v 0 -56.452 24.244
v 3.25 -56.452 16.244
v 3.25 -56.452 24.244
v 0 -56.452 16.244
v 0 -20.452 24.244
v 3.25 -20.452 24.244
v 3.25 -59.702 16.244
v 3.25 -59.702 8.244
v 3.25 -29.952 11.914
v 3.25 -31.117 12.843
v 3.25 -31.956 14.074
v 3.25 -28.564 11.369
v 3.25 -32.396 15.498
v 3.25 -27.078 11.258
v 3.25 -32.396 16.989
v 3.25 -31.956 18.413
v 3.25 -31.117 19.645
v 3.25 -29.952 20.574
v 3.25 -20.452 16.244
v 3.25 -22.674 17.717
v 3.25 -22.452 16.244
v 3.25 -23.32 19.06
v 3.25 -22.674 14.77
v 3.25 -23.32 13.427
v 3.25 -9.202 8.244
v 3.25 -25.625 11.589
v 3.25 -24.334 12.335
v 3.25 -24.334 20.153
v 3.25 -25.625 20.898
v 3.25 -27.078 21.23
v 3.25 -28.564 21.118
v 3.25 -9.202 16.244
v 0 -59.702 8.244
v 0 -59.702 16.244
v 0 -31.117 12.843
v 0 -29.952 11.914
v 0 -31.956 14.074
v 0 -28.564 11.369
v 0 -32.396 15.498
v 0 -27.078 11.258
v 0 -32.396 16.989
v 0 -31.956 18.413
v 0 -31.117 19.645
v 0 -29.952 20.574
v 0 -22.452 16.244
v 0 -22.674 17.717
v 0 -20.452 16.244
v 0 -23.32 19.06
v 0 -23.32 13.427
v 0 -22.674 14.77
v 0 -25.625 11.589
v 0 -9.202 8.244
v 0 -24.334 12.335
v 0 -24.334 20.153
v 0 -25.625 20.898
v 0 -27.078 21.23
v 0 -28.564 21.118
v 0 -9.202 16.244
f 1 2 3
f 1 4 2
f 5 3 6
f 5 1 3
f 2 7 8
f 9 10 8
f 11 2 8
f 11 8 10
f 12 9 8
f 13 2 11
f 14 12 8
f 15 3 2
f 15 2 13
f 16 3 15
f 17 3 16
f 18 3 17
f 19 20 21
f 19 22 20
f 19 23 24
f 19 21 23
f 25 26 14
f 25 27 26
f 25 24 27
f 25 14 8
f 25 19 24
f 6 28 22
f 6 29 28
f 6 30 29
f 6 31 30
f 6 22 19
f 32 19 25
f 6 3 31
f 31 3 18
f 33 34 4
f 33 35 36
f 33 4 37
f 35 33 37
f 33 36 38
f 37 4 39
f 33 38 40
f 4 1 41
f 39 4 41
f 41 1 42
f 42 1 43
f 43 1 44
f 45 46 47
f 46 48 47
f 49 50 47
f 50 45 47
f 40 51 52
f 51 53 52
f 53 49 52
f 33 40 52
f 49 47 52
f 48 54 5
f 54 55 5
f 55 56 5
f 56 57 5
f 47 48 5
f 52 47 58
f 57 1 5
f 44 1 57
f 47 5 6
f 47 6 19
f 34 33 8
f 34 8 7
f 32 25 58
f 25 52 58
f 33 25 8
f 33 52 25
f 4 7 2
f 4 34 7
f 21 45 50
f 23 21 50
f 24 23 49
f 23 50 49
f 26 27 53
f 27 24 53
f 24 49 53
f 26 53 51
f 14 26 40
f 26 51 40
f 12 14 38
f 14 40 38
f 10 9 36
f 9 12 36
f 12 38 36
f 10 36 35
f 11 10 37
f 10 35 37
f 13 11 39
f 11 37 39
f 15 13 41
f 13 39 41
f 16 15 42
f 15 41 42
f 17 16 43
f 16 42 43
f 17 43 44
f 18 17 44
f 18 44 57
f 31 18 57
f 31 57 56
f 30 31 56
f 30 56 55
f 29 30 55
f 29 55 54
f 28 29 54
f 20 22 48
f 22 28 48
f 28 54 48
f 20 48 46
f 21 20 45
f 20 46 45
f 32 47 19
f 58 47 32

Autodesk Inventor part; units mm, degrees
ref_plane "YZ Plane" through (0, 0, 0) normal (1, 0, 0) x (0, 1, 0)
ref_plane "XZ Plane" through (0, 0, 0) normal (0, 1, 0) x (-1, 0, 0)
ref_plane "XY Plane" through (0, 0, 0) normal (0, 0, 1) x (1, 0, 0)
sketch "Sketch1" plane through (0, 0, 0) normal (1, 0, 0) x (0, 1, 0)
  line L0 (-92.7646, -8.503) -> (-89.7646, -8.503)
  line L1 (-89.7646, -8.503) -> (-89.7646, -11.753)
  line L2 (-89.7646, -11.753) -> (-92.7646, -11.753)
  line L3 (-92.7646, -11.753) -> (-92.7646, -8.503)
  line L4 (-92.7646, -21.6527) -> (-89.7646, -21.6527)
  line L5 (-89.7646, -21.6527) -> (-89.7646, -21.7527)
  line L6 (-89.7646, -21.7527) -> (-92.7646, -21.7527)
  line L7 (-92.7646, -21.7527) -> (-92.7646, -21.6527)
  line L8 (-56.4516, 8.2437) -> (-59.7016, 8.2437)
  line L9 (-59.7016, 8.2437) -> (-59.7016, 16.2437)
  line L10 (-59.7016, 16.2437) -> (-56.4516, 16.2437)
  line L11 (-56.4516, 16.2437) -> (-56.4516, 8.2437)
  line L12 (-34.4516, 24.2437) -> (-34.4516, 8.2437) construction
  line L13 (-12.4516, 8.2437) -> (-9.2016, 8.2437)
  line L14 (-9.2016, 8.2437) -> (-9.2016, 16.2437)
  line L15 (-9.2016, 16.2437) -> (-12.4516, 16.2437)
  line L16 (-12.4516, 16.2437) -> (-12.4516, 8.2437)
  circle A0 centre (-27.4516, 16.2437) radius 5
  line L17 (-12.4516, 8.2437) -> (-20.4516, 8.2437)
  line L18 (-20.4516, 8.2437) -> (-20.4516, 16.2437)
  line L19 (-20.4516, 16.2437) -> (-12.4516, 16.2437)
  line L20 (-12.4516, 16.2437) -> (-12.4516, 8.2437)
  line L21 (-20.4516, 8.2437) -> (-56.4516, 8.2437)
  line L22 (-56.4516, 8.2437) -> (-56.4516, 24.2437)
  line L23 (-56.4516, 24.2437) -> (-20.4516, 24.2437)
  line L24 (-20.4516, 24.2437) -> (-20.4516, 8.2437)
  point P0 (0, 0)
  dimension "d0" = 3
  dimension "mat" = 3.25
  dimension "d2" = 3
  dimension "kerf" = 0.1
  dimension "d27" = 3.25
  dimension "d28" = 8
  dimension "d29" = 10
  dimension "d34" = 2
  dimension "d35" = 8
  dimension "d38" = 36
extrude "Extrusion5" add sketch "Sketch1" along normal blind 3.25 contours L8 L9 L10 L11 | L11 L22 L23 L24 L18 L21 | L18 L19 L16 L17 | L16 L15 L14 L13
equation "\"d27\" = mat"
equation "\"d36\" = mat"
properties part number "body-side2"
